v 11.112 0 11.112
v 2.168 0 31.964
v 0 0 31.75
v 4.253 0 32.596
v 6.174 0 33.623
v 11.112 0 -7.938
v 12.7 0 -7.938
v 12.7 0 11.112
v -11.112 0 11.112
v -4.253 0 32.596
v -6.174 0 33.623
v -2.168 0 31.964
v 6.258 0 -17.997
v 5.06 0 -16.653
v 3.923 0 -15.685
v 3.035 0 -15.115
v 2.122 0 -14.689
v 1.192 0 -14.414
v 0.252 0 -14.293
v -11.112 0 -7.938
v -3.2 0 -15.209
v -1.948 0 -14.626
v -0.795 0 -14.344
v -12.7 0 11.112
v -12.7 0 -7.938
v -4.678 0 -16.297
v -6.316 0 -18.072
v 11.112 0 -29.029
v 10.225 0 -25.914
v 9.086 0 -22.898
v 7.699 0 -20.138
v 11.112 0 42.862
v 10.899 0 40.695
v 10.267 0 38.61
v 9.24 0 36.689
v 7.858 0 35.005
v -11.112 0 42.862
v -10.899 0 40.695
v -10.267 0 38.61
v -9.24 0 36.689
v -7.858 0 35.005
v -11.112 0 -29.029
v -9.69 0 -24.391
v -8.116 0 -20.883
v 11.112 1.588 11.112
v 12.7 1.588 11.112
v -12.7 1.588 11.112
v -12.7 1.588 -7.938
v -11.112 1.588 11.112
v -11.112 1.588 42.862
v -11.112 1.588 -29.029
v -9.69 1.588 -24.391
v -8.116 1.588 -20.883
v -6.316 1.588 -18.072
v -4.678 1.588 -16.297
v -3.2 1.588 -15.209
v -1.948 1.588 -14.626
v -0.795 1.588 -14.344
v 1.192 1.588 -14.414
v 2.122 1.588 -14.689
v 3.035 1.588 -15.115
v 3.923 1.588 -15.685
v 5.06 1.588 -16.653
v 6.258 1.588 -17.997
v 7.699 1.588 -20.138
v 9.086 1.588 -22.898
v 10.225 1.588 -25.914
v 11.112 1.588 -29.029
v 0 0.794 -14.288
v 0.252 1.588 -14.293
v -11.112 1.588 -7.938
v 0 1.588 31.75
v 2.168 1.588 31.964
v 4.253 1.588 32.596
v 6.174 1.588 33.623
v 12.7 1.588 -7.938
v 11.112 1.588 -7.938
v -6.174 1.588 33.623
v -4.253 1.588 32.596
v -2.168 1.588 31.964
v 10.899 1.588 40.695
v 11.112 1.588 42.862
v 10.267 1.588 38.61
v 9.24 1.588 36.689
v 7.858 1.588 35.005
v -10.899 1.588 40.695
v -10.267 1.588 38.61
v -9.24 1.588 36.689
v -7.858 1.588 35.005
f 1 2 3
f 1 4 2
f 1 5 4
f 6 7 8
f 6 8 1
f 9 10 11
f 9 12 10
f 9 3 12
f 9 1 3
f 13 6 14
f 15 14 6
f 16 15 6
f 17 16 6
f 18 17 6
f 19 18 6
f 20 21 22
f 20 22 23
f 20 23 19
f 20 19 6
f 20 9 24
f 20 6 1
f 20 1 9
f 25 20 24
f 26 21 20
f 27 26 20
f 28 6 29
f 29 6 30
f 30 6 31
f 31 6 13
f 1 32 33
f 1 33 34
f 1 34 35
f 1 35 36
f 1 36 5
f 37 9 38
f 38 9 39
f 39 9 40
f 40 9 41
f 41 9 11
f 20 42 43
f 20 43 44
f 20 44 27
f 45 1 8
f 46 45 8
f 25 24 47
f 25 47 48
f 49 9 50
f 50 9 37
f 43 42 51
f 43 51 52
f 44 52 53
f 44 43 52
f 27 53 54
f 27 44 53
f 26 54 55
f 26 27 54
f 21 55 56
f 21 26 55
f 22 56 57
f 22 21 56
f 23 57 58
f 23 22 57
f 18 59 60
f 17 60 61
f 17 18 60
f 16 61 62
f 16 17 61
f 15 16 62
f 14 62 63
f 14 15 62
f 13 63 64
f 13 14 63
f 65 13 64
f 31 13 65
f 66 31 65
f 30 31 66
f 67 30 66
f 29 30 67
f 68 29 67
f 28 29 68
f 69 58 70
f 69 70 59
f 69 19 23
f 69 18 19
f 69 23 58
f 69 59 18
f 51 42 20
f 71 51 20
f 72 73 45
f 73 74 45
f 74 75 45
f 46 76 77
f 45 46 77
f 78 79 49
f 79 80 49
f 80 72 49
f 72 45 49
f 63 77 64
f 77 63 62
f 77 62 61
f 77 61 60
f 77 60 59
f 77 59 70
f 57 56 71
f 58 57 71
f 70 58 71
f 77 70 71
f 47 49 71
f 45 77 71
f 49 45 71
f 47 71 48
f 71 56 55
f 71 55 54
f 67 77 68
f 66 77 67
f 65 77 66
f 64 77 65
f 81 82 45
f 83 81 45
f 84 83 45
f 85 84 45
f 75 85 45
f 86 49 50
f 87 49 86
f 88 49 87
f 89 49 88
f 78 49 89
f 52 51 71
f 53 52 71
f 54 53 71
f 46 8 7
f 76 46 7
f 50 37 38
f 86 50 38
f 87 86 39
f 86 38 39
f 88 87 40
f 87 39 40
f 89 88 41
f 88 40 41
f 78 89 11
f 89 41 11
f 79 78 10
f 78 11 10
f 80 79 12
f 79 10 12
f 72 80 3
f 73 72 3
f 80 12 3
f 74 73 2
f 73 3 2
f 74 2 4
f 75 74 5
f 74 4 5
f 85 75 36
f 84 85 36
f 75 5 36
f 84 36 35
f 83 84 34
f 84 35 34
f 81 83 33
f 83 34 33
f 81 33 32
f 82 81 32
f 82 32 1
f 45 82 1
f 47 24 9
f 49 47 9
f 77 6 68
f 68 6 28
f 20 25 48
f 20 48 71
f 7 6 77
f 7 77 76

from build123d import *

# Parameters (mm, degrees)
SKETCH1_W           = 1.5875
SKETCH1_H           = 19.05
BOSS_EXTRUDE1_DEPTH = 1.5875


with BuildPart() as part:
    # Sketch1 → Boss-Extrude1 (new body)
    with BuildSketch(Plane(origin=(0, 0, 0), x_dir=(1, 0, 0), z_dir=(0, 1, 0))):
        with BuildLine():
            Line((11.1125, 7.9375), (11.1125, 29.02868761))
            add(Edge.make_bspline(
                [(-11.1125, 29.02868761), (0, -16.161766196), (11.1125, 29.02868761)],
                knots=[2.076156837, 2.076156837, 2.076156837, 4.20702847, 4.20702847, 4.20702847], degree=2, weights=[1, 0.484122918, 1]))
            Line((-11.1125, 29.02868761), (-11.1125, 7.9375))
            Line((-11.1125, 7.9375), (-11.1125, -11.1125))
            Line((-11.1125, -11.1125), (-11.1125, -42.8625))
            ThreePointArc((-11.1125, -42.8625), (0, -31.75), (11.1125, -42.8625))
            Line((11.1125, -42.8625), (11.1125, -11.1125))
            Line((11.1125, -11.1125), (11.1125, 7.9375))
        make_face()
        with Locations((11.90625, -1.5875)):
            Rectangle(SKETCH1_W, SKETCH1_H)
        with Locations((-11.90625, -1.5875)):
            Rectangle(SKETCH1_W, SKETCH1_H)
    extrude(amount=BOSS_EXTRUDE1_DEPTH)


solid = part.part
